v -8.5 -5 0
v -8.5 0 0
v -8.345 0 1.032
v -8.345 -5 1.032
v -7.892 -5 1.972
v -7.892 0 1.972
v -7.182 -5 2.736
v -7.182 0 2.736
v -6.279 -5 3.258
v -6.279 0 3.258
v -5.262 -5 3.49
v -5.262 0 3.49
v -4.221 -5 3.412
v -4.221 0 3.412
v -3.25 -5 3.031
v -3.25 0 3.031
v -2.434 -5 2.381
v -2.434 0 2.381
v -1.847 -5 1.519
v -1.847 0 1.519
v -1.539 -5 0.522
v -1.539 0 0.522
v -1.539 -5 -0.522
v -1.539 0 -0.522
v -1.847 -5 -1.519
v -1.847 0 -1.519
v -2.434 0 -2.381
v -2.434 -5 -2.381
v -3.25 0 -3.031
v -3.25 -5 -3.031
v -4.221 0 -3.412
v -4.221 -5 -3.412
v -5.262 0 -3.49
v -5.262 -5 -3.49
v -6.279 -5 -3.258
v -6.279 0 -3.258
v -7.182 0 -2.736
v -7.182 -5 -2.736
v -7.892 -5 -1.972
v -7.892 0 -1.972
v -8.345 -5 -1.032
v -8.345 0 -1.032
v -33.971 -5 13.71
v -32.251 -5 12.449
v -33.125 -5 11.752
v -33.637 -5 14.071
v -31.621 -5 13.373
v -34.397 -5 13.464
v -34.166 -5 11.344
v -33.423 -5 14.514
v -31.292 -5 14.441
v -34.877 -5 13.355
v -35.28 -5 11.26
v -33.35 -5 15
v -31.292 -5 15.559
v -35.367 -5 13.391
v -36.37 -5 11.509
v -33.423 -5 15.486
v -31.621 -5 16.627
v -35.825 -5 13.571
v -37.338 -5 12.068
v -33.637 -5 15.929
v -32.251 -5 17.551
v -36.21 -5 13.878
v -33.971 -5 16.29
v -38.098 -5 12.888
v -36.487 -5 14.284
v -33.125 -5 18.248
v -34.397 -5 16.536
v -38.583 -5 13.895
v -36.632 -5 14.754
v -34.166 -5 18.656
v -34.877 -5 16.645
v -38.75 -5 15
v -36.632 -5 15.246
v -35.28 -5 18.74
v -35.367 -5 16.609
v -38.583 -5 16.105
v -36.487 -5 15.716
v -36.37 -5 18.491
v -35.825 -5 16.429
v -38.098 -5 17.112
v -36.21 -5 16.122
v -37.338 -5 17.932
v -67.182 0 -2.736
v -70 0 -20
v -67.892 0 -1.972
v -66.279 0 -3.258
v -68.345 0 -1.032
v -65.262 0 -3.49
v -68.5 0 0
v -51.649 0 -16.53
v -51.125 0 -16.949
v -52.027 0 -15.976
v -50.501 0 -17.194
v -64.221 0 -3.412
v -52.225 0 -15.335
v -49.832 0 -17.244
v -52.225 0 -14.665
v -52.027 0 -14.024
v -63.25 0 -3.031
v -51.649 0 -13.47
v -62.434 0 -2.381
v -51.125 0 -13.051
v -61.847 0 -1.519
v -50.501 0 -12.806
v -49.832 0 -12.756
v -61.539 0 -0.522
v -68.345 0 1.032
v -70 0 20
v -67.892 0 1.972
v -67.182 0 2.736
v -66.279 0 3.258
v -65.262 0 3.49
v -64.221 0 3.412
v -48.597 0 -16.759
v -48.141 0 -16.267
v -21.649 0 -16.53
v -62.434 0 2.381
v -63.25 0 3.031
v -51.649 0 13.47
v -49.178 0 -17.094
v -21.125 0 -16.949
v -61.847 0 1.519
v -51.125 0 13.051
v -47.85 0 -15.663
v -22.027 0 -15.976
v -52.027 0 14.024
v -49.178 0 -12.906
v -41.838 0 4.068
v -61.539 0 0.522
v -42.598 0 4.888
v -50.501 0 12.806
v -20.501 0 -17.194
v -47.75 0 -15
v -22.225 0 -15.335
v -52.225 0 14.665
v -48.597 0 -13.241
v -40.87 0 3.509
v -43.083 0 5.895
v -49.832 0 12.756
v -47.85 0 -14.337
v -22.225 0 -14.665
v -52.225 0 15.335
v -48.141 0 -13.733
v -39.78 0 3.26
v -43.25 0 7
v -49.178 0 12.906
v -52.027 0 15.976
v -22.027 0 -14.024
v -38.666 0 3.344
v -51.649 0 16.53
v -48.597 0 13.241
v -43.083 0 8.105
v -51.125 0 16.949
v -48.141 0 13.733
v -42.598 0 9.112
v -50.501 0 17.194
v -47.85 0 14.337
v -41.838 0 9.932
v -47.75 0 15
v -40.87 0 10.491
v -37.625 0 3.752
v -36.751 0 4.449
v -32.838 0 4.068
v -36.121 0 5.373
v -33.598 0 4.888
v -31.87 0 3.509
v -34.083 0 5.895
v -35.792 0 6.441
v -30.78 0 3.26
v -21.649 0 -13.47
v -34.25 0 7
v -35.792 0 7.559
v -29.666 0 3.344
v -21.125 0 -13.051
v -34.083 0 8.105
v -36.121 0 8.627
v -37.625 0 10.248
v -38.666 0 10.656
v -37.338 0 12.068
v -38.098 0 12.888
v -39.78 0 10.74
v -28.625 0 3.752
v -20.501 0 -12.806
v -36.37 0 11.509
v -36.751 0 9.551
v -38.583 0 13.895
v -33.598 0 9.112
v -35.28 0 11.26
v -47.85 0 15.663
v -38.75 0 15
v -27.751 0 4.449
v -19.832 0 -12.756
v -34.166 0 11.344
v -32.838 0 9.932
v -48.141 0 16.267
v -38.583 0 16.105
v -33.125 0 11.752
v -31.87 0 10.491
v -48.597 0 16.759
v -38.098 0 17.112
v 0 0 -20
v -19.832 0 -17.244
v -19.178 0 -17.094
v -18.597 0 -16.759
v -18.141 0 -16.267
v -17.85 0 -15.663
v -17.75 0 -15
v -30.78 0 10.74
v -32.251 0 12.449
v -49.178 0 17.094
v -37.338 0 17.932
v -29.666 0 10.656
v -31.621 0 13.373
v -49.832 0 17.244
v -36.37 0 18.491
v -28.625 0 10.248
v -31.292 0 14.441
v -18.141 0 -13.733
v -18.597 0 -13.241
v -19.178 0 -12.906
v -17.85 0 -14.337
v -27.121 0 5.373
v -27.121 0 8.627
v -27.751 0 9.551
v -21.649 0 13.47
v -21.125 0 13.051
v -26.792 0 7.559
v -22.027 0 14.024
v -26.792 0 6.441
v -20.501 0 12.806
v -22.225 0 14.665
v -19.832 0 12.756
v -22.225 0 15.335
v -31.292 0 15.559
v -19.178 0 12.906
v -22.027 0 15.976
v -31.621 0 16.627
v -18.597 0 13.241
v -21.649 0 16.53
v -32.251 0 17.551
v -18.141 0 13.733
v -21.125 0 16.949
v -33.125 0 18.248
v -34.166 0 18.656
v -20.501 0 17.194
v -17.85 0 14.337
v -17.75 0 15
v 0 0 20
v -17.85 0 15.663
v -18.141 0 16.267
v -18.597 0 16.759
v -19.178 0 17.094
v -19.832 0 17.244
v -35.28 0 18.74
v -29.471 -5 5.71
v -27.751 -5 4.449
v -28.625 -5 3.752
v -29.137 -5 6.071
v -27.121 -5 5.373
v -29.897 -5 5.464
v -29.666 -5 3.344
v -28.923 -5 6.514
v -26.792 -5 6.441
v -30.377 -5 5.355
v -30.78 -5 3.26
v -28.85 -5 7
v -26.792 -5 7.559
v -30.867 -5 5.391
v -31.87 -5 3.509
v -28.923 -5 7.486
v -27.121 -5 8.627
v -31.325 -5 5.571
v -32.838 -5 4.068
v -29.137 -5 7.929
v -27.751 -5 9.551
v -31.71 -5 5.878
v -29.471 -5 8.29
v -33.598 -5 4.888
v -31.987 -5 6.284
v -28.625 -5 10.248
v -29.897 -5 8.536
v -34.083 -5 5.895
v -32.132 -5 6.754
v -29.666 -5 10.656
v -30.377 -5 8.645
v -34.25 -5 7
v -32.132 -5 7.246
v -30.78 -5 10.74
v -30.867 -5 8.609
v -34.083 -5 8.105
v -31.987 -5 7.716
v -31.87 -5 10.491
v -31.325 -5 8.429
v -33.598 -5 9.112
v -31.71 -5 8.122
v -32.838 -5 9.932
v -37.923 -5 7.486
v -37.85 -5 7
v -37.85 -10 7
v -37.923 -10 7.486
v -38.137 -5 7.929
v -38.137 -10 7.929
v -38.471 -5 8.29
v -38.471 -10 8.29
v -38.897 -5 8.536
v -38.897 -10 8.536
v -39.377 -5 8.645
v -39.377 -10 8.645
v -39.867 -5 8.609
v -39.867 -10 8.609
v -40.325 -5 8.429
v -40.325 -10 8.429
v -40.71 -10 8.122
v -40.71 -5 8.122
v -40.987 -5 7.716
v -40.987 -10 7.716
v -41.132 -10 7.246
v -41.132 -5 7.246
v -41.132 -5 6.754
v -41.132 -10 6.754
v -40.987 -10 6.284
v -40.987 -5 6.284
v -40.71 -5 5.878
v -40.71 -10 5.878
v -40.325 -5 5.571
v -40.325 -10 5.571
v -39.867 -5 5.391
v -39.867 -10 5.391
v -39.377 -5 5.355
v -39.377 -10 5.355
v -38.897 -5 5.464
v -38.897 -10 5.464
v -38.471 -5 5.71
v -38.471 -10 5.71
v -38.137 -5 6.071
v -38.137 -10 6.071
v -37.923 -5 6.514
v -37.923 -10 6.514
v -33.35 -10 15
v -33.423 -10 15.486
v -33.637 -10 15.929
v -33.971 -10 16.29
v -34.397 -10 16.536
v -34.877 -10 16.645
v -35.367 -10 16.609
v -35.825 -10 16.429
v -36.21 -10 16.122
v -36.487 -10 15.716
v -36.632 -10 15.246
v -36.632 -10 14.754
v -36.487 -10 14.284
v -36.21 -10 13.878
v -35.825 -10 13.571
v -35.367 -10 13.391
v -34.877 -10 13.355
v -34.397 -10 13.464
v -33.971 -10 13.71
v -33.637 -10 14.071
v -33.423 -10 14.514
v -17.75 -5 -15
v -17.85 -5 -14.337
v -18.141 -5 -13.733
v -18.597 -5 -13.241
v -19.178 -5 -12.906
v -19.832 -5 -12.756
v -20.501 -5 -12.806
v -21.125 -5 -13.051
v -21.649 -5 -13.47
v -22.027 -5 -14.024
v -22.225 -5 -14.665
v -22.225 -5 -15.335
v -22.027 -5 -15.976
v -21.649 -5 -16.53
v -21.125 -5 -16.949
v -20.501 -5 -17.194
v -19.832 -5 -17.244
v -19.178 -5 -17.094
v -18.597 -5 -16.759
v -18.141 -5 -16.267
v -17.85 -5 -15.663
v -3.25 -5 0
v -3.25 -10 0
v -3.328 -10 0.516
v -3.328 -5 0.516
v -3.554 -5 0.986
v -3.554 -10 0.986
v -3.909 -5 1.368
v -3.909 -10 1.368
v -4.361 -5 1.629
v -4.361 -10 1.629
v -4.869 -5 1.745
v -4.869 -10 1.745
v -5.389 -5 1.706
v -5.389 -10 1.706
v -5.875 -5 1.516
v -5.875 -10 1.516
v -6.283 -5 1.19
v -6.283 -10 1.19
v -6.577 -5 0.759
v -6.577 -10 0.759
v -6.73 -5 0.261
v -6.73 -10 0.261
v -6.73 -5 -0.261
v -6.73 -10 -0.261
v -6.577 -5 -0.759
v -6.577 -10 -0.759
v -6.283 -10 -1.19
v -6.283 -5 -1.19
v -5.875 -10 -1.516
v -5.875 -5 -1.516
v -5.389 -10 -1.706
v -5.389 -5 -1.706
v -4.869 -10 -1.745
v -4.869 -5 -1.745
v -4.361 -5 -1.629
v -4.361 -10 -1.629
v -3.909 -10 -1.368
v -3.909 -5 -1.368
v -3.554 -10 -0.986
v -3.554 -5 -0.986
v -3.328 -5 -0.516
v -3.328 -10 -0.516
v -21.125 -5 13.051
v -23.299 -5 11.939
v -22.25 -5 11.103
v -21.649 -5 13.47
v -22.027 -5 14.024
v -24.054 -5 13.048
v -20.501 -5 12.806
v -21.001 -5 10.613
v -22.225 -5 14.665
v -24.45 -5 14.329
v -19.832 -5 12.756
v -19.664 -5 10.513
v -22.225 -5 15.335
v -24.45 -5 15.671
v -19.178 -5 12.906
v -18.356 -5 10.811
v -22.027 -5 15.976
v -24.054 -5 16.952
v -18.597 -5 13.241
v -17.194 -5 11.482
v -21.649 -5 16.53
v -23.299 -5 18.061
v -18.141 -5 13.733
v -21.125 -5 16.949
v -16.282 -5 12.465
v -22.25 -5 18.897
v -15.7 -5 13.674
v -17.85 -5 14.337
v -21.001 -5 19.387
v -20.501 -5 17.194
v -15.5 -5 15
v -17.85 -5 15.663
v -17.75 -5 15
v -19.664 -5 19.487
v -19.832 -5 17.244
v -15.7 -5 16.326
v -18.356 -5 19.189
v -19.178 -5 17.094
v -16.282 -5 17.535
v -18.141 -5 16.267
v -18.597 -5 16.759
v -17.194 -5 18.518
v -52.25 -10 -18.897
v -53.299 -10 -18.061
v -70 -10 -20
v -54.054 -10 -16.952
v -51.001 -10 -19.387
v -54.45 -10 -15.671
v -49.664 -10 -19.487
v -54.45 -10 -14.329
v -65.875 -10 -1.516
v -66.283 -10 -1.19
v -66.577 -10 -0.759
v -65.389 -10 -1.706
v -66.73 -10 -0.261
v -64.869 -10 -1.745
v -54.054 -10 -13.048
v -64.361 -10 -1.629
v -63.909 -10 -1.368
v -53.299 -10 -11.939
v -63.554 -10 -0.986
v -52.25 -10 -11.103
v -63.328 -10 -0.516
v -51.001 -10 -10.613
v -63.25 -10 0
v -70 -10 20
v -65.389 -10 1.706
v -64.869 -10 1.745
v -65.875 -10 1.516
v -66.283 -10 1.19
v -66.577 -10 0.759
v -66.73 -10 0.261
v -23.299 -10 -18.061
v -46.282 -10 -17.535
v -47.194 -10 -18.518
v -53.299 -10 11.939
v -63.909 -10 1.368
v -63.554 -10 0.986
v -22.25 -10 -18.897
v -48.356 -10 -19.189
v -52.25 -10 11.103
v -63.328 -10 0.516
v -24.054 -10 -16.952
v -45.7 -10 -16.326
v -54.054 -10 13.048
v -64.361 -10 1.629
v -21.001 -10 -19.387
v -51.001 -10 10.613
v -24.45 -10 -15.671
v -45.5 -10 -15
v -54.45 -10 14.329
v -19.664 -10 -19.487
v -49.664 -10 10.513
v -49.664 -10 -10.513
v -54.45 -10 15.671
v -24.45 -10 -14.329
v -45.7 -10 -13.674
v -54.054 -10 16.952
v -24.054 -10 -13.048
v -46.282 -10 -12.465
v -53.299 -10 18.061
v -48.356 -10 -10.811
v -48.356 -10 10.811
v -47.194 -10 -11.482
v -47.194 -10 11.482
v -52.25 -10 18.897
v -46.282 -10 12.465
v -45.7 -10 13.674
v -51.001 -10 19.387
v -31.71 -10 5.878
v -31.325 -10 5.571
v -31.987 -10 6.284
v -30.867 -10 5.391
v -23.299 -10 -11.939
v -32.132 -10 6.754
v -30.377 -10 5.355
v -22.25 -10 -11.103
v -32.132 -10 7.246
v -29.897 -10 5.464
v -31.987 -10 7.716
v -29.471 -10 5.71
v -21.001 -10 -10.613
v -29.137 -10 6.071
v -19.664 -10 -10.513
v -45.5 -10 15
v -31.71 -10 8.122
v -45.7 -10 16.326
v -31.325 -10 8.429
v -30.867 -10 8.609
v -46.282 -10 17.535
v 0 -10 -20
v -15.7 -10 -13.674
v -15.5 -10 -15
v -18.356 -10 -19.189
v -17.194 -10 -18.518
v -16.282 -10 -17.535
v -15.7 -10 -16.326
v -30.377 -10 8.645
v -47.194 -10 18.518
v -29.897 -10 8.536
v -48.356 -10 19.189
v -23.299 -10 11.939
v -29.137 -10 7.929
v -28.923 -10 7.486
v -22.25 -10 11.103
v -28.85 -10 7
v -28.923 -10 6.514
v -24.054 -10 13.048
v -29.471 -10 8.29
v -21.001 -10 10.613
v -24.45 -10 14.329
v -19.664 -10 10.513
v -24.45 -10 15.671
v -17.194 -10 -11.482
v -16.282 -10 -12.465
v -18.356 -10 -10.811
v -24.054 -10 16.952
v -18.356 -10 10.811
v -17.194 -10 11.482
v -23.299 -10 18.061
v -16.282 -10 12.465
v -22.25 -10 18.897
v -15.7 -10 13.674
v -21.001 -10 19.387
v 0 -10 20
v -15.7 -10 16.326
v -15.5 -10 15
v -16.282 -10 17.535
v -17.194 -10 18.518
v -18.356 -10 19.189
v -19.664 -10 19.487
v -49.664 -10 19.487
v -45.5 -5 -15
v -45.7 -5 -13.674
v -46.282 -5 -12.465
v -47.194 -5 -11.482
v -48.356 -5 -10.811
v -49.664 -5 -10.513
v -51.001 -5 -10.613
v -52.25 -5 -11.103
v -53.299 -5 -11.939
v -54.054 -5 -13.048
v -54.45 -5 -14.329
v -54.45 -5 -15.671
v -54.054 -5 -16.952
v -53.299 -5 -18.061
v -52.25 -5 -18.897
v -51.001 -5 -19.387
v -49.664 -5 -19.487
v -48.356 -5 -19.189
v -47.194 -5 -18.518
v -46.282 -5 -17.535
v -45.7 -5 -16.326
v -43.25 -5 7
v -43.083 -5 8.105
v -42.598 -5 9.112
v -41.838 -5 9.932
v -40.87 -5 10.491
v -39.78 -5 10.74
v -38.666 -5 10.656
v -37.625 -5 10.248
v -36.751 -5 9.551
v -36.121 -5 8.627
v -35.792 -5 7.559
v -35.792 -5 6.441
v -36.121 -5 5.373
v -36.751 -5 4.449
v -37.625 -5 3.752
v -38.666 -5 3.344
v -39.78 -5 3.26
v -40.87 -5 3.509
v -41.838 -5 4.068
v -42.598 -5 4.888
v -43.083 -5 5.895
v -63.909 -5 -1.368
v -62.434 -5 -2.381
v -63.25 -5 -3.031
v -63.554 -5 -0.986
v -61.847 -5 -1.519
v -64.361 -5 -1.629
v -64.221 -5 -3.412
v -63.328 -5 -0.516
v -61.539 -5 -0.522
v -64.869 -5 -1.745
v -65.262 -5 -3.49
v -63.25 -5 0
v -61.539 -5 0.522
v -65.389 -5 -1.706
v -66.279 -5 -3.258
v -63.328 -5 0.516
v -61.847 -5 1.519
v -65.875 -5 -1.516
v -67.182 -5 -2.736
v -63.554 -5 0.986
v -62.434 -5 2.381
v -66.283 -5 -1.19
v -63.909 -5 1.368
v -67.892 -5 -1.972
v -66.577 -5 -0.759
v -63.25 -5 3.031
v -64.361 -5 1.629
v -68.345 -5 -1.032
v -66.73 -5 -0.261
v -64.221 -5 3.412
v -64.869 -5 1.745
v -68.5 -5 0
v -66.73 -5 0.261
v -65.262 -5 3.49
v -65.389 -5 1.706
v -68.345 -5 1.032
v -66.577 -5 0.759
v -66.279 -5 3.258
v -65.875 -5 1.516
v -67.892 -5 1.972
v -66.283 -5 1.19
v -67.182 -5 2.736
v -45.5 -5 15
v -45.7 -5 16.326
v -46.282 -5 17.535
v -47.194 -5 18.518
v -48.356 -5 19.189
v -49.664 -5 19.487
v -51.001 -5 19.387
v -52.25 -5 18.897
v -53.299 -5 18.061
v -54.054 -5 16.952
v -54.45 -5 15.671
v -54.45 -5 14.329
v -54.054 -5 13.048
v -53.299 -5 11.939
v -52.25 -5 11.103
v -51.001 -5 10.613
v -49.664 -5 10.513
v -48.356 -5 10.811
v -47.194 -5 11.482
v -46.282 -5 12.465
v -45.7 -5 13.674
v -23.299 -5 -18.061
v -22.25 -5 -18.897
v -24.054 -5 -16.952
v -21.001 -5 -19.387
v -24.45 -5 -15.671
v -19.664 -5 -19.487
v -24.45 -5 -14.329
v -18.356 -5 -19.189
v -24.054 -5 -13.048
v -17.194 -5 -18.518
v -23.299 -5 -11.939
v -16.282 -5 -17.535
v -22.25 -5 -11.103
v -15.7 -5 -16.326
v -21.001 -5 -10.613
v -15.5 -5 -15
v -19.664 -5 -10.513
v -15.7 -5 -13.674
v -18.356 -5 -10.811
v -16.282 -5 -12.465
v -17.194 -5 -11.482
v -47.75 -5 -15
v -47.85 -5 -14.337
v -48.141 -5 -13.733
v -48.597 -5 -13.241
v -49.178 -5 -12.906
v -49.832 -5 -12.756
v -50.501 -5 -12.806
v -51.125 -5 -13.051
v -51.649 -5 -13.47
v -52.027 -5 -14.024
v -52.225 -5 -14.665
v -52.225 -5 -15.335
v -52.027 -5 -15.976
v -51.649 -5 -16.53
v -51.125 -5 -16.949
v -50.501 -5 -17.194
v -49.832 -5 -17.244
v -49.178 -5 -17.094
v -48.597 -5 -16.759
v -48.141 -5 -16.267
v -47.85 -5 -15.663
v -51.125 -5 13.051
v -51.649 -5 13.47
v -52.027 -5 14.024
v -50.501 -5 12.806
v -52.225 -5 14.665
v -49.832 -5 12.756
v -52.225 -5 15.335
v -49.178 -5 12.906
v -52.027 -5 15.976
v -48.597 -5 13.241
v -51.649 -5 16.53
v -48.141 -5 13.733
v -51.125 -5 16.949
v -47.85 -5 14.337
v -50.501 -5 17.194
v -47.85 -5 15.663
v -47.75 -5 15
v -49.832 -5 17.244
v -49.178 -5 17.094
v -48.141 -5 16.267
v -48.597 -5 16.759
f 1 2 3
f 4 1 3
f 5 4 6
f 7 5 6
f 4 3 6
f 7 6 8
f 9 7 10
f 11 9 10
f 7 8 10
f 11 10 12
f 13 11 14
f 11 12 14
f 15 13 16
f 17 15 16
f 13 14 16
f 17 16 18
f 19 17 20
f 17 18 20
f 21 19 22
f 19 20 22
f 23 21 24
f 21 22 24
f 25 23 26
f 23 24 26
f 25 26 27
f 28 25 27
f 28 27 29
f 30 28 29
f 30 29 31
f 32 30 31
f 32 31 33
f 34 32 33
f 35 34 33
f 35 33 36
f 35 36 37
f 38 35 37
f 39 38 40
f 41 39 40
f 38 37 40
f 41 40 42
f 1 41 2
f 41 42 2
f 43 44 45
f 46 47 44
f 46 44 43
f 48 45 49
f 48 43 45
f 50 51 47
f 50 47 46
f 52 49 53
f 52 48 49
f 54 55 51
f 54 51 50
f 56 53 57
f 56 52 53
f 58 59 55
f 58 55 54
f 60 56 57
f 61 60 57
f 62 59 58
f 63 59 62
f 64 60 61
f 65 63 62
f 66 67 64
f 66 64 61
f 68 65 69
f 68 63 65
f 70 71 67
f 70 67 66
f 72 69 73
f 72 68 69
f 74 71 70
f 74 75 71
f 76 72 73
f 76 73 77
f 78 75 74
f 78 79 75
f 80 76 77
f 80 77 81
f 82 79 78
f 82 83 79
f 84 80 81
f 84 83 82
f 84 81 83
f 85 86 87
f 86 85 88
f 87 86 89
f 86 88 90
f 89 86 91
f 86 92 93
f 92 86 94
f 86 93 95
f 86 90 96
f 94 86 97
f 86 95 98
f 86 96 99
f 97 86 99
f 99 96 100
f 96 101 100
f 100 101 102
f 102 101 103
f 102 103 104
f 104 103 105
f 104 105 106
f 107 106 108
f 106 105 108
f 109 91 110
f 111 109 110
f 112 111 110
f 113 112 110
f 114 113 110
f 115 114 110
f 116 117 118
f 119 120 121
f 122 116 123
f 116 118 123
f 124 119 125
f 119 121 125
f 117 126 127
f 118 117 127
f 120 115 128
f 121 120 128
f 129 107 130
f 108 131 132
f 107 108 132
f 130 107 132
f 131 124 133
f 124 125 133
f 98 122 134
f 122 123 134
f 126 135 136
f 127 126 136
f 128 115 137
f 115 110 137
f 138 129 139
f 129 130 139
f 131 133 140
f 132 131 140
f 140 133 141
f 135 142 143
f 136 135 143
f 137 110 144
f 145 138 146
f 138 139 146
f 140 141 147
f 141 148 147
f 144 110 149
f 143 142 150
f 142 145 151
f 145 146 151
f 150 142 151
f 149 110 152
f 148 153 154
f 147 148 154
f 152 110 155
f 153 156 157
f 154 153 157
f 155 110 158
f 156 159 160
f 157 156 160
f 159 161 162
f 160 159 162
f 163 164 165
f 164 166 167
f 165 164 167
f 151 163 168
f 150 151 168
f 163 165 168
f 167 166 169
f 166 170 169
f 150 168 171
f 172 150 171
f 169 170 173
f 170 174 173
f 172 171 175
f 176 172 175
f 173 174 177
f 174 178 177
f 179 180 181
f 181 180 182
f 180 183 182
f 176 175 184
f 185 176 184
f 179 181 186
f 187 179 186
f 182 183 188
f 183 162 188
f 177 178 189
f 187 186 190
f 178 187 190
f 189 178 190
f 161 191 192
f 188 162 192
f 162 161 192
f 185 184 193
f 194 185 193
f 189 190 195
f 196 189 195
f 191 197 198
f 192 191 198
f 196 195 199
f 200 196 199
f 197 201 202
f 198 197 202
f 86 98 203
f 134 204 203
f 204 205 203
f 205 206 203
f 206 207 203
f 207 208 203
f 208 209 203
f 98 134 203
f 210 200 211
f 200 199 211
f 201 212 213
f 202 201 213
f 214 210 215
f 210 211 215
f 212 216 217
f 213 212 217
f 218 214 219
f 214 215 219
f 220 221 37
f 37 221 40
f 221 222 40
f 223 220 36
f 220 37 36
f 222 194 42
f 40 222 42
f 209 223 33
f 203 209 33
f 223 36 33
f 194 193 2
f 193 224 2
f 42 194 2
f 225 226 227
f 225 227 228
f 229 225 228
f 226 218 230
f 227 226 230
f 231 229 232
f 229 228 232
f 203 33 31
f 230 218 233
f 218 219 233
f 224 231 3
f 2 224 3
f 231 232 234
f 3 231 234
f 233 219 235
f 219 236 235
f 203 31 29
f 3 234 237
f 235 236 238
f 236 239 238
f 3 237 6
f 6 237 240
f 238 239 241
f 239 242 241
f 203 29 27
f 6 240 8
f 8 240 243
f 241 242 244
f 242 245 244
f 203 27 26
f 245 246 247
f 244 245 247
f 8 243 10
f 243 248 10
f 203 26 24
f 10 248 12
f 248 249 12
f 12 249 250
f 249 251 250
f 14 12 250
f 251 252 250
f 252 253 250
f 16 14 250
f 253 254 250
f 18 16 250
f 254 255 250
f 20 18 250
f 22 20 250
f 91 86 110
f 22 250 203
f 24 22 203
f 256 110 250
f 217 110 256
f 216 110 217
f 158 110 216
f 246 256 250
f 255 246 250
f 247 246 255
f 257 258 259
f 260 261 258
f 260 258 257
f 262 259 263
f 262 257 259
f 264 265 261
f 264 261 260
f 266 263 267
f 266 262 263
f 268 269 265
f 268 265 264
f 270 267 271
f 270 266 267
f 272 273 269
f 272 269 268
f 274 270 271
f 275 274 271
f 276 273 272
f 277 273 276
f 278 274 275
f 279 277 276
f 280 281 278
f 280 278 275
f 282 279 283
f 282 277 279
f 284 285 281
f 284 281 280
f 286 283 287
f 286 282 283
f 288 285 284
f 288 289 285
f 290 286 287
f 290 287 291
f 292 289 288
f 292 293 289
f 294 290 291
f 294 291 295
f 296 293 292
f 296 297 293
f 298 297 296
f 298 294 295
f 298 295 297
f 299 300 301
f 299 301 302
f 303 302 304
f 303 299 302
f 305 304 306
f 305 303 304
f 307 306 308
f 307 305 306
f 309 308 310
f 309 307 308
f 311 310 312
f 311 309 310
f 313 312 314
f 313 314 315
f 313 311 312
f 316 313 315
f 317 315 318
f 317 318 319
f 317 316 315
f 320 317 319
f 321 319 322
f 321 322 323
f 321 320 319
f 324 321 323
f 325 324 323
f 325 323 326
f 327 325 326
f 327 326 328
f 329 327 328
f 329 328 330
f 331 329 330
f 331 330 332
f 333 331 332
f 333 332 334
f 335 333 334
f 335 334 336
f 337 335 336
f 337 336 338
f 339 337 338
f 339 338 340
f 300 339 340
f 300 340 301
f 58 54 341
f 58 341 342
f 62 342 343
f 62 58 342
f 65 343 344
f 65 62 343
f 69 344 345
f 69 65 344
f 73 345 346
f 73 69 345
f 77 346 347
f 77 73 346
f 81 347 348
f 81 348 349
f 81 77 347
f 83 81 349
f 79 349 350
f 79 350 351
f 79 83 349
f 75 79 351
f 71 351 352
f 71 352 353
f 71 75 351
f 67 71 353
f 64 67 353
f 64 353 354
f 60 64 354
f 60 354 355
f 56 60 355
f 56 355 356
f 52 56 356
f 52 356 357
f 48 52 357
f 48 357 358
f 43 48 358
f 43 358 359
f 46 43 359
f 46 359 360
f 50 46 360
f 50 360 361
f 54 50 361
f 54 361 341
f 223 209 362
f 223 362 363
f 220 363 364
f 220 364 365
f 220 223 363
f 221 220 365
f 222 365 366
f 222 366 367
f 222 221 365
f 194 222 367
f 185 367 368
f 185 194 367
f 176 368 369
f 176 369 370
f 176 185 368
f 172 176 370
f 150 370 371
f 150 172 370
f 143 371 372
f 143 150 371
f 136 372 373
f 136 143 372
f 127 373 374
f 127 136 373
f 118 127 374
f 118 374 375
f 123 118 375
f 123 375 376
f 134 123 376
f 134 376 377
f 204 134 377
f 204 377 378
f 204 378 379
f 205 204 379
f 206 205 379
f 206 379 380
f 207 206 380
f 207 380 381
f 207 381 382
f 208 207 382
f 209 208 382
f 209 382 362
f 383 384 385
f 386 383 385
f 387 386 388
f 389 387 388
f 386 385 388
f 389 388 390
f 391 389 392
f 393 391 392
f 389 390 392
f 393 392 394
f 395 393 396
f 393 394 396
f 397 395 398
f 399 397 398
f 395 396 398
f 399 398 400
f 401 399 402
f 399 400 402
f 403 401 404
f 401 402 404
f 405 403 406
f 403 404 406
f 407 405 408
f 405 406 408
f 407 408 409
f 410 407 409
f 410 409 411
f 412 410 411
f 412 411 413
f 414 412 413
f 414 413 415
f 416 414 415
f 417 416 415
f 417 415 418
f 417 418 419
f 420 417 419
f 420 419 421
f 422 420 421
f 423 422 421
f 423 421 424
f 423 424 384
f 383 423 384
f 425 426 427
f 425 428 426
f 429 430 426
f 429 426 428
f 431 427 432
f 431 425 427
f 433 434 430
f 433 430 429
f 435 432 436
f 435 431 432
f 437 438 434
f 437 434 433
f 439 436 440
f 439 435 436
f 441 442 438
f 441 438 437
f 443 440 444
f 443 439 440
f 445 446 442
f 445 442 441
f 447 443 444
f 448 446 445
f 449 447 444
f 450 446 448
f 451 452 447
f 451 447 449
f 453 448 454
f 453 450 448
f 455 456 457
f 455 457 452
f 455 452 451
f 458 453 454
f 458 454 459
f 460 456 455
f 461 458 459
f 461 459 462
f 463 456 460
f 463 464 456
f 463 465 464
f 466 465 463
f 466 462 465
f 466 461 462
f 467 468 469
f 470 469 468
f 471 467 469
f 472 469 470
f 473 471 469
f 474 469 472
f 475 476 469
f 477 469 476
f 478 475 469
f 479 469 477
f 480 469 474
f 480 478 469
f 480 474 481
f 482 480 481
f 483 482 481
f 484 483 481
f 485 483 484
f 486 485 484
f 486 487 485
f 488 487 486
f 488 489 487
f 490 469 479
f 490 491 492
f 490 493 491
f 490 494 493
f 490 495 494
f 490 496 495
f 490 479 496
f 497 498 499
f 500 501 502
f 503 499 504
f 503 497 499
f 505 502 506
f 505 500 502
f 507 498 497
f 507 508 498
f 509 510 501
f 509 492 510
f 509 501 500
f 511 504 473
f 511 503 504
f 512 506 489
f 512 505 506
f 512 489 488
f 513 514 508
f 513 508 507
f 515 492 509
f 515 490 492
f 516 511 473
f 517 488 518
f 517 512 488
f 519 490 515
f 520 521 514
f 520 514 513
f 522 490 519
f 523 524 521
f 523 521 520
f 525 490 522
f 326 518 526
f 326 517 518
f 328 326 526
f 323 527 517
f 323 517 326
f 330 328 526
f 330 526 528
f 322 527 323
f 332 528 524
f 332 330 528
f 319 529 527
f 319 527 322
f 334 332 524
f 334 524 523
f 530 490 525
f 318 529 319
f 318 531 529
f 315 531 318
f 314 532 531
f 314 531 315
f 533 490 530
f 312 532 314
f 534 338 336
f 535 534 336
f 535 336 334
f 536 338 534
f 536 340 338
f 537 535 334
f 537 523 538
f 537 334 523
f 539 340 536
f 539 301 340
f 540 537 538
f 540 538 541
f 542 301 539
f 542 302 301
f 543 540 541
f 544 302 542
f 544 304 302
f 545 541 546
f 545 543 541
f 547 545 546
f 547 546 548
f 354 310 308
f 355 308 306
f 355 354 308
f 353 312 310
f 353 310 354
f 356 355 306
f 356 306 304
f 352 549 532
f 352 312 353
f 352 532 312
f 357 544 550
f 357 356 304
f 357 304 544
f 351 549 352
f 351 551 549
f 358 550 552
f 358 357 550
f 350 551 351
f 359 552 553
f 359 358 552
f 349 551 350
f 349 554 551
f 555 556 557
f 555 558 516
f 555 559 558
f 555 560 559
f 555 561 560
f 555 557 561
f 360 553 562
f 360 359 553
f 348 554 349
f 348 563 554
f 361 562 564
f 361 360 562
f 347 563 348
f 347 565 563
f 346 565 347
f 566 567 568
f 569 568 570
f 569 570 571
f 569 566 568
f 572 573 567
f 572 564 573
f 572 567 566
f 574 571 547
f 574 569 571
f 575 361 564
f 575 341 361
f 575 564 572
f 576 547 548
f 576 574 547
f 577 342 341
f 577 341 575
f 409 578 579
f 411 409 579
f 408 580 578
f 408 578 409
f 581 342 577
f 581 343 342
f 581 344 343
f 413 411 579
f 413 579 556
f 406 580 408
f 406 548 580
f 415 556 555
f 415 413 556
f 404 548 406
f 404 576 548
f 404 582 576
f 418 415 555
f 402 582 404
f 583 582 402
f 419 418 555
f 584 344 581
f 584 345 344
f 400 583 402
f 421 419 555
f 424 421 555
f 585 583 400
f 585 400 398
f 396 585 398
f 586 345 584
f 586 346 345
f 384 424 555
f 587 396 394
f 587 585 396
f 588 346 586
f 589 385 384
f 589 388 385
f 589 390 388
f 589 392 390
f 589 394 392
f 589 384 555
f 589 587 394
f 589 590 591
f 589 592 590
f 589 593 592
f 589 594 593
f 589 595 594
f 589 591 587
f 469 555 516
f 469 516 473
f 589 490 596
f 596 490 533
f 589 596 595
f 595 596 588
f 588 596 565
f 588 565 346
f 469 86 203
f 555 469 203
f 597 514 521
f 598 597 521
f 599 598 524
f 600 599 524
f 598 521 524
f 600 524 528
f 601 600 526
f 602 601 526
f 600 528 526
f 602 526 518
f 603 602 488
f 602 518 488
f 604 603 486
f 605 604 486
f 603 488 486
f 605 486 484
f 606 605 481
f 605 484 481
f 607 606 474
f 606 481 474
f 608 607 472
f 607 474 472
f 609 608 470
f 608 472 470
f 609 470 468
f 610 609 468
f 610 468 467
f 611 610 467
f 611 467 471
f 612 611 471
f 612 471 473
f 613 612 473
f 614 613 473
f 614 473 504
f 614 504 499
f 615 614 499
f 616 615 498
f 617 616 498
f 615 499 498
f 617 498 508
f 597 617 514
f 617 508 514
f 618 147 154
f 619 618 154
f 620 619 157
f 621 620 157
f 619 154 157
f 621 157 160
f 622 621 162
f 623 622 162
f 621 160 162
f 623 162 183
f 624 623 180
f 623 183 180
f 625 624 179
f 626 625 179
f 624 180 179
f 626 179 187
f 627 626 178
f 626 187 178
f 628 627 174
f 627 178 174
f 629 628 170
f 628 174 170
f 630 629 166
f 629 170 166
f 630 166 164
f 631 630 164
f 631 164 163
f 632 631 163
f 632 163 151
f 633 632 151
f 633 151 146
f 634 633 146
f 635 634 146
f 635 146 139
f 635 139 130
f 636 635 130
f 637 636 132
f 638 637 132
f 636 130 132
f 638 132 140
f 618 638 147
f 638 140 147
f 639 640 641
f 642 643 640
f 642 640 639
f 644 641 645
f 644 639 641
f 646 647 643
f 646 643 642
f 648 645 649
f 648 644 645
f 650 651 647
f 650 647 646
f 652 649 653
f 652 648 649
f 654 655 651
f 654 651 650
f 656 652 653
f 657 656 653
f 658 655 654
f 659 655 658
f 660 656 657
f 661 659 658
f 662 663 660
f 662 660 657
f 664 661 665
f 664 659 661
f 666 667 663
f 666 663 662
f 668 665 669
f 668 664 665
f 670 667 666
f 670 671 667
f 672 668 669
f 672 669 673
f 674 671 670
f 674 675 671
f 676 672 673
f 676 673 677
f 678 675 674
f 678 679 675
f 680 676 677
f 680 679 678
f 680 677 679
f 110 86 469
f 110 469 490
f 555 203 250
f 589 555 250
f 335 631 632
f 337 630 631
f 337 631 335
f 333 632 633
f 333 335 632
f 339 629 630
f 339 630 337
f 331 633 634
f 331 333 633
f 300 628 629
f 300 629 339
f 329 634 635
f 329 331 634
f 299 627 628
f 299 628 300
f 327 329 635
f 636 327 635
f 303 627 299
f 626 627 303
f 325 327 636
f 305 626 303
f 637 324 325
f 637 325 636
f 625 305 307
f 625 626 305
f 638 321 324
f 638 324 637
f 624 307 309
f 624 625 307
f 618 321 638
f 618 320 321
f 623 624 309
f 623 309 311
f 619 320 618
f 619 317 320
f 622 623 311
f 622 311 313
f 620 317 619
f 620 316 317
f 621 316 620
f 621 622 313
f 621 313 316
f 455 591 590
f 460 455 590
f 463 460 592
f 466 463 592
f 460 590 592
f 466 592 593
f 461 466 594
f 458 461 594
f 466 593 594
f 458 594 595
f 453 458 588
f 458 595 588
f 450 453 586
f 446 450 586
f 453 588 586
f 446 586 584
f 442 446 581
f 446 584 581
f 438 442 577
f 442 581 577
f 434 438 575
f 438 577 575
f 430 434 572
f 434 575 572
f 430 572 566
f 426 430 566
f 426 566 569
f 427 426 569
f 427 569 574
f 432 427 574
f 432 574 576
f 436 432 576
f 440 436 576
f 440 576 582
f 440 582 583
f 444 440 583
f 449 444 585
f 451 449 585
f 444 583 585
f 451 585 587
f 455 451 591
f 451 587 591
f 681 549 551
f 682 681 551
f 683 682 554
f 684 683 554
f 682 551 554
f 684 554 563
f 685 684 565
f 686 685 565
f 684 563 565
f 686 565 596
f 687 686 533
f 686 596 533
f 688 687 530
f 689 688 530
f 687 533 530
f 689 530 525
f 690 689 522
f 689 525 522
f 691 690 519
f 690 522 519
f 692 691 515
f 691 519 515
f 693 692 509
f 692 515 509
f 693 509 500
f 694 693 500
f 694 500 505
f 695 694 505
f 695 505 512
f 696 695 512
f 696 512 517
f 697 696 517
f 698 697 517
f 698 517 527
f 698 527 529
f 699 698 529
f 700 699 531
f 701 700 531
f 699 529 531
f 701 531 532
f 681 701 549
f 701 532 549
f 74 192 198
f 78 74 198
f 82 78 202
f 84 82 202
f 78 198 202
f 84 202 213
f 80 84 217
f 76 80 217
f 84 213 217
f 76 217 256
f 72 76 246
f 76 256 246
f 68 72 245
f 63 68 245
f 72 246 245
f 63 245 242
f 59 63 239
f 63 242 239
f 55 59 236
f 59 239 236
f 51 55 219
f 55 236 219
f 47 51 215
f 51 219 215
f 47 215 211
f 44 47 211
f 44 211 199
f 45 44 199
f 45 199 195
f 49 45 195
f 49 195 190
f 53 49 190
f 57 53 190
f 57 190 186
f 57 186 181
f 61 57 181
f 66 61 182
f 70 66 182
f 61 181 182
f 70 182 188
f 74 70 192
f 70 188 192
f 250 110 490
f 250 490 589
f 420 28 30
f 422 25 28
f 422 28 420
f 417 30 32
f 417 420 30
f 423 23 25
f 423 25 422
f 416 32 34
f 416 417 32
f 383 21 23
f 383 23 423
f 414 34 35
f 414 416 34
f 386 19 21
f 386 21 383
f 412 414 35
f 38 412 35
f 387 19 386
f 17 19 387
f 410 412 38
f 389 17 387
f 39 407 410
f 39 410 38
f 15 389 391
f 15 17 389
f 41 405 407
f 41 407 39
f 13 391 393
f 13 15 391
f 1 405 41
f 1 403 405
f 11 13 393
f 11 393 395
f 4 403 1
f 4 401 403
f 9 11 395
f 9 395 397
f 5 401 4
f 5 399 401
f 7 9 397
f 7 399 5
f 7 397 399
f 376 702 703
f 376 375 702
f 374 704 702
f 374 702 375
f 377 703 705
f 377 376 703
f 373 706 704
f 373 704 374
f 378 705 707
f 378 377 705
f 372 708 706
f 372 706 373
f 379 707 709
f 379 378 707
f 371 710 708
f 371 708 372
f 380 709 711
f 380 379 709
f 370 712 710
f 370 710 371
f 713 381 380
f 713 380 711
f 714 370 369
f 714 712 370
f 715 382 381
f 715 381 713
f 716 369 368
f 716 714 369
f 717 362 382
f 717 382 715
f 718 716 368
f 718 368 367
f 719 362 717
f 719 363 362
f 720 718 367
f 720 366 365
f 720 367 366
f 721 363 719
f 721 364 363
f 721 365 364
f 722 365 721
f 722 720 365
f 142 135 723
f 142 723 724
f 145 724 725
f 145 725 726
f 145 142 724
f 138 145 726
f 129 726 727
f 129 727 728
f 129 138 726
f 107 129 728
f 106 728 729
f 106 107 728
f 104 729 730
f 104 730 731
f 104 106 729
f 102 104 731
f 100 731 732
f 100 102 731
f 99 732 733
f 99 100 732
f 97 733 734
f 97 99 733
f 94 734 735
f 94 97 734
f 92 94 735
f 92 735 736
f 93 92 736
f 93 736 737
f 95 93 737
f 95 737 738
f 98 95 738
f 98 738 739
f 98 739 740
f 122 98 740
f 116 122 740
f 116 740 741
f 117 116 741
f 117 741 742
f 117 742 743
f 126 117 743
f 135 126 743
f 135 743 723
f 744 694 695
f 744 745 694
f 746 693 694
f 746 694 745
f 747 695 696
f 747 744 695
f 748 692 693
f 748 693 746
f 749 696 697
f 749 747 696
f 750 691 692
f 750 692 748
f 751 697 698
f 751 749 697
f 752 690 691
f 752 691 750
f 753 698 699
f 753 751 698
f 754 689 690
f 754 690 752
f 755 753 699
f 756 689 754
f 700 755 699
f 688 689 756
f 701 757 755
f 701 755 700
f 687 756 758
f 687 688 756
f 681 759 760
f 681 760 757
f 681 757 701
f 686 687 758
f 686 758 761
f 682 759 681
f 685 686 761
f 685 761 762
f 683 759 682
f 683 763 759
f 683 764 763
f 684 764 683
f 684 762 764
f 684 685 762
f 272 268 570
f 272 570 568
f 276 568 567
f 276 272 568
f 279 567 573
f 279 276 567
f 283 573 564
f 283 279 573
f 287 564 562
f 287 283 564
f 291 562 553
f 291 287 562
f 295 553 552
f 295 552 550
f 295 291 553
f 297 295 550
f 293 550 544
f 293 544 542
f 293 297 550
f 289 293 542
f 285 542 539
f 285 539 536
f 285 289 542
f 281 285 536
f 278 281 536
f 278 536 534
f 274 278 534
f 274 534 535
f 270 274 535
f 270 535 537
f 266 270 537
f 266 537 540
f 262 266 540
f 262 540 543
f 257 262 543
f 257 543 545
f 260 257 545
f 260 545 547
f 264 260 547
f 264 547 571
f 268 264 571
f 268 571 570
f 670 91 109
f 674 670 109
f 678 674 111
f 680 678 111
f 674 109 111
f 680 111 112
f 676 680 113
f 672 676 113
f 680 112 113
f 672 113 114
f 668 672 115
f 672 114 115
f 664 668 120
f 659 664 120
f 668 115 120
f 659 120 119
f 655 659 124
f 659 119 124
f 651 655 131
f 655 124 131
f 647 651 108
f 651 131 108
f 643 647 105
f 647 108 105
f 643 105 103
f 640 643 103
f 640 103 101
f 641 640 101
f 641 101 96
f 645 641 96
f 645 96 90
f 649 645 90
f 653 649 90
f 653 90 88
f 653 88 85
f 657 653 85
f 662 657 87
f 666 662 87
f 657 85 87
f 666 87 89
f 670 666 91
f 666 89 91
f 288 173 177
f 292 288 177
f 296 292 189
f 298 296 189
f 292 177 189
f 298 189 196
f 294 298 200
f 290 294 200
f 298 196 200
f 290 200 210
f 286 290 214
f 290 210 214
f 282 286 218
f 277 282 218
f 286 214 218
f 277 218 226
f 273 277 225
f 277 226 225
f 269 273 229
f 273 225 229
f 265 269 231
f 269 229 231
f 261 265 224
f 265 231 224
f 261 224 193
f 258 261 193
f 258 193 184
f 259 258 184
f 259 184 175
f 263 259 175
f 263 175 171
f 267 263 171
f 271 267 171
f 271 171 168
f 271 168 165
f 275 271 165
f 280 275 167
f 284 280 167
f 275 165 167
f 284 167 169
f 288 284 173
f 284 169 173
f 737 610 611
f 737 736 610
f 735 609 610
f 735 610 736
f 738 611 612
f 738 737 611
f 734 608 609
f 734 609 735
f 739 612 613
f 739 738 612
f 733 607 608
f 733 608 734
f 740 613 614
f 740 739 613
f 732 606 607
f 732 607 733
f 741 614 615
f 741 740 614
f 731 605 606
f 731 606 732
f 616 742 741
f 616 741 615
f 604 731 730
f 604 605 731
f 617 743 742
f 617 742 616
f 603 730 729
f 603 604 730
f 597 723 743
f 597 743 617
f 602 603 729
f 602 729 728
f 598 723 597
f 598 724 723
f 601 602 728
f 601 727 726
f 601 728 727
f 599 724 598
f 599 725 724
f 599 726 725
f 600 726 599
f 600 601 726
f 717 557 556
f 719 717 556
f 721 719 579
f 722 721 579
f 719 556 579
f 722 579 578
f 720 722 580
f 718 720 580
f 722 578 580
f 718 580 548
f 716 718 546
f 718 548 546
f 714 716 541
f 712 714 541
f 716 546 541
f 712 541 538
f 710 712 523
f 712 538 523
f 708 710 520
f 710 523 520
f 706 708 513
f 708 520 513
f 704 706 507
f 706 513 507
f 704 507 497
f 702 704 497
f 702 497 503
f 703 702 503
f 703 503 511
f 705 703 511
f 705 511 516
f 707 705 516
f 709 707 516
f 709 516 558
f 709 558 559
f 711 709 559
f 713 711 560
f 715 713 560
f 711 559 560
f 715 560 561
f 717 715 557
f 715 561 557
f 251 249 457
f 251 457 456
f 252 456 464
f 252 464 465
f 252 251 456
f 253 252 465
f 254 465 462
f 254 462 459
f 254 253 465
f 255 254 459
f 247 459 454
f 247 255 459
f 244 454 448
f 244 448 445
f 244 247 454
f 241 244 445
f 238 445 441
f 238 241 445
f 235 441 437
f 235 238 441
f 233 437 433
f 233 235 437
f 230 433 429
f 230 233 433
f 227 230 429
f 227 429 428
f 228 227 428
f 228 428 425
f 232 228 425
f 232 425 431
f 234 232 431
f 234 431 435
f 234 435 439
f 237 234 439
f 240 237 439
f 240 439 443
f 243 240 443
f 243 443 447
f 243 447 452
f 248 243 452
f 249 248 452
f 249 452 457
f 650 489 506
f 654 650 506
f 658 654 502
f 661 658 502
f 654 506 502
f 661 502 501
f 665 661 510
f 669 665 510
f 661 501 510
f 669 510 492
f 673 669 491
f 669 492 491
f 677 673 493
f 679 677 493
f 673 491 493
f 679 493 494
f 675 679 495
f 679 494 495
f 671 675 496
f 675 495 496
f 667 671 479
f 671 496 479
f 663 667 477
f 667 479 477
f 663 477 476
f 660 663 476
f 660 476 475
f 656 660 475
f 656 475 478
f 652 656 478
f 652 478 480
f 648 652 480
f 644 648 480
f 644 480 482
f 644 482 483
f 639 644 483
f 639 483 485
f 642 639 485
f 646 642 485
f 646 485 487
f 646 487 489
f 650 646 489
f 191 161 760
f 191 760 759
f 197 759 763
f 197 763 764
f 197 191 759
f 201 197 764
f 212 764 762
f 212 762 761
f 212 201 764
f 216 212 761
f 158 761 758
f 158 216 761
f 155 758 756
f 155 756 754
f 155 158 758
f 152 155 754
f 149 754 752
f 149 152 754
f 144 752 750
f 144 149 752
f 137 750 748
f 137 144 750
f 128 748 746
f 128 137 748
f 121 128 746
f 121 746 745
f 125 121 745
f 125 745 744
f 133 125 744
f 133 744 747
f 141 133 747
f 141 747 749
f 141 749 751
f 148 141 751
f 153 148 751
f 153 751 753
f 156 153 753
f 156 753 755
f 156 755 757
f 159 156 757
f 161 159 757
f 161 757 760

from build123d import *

# Parameters (mm, degrees)
F0_W     = 70
F0_H     = 40
F0_R     = 2.25
F0_R_2   = 1.65
F1_DEPTH = 10
F2_R     = 2.25
F2_R_2   = 4.5
F3_DEPTH = 5
F4_R     = 3.75
F5_DEPTH = 5
F6_R     = 1.75
F7_DEPTH = 25
F8_R     = 3.5
F9_DEPTH = 5


with BuildPart() as f1:
    # F0 (on Front) → F1 (new body)
    with BuildSketch(Plane.XZ):
        with Locations((-35, 0)):
            Rectangle(F0_W, F0_H)
        with Locations((-50, -15)):
            Circle(F0_R, mode=Mode.SUBTRACT)
        with Locations((-20, -15)):
            Circle(F0_R, mode=Mode.SUBTRACT)
        with Locations((-39.5, 7)):
            Circle(F0_R_2, mode=Mode.SUBTRACT)
        with Locations((-50, 15)):
            Circle(F0_R, mode=Mode.SUBTRACT)
        with Locations((-30.5, 7)):
            Circle(F0_R_2, mode=Mode.SUBTRACT)
        with Locations((-35, 15)):
            Circle(F0_R_2, mode=Mode.SUBTRACT)
        with Locations((-20, 15)):
            Circle(F0_R, mode=Mode.SUBTRACT)
    extrude(amount=F1_DEPTH)

    # F2 (on face) → F3 (cut)
    with BuildSketch(Plane.XZ.offset(10)):
        with Locations((-50, 15)):
            Circle(F2_R)
        with Locations((-20, 15)):
            Circle(F2_R)
        with Locations((-20, -15)):
            Circle(F2_R)
        with Locations((-50, -15)):
            Circle(F2_R)
        with Locations((-20, 15)):
            Circle(F2_R_2)
        with Locations((-20, 15)):
            Circle(F2_R, mode=Mode.SUBTRACT)
        with Locations((-20, -15)):
            Circle(F2_R_2)
        with Locations((-20, -15)):
            Circle(F2_R, mode=Mode.SUBTRACT)
        with Locations((-50, -15)):
            Circle(F2_R_2)
        with Locations((-50, -15)):
            Circle(F2_R, mode=Mode.SUBTRACT)
        with Locations((-50, 15)):
            Circle(F2_R_2)
        with Locations((-50, 15)):
            Circle(F2_R, mode=Mode.SUBTRACT)
    extrude(amount=-F3_DEPTH, mode=Mode.SUBTRACT)

    # F4 (on face) → F5 (cut)
    with BuildSketch(Plane(origin=(0, 0, 0), x_dir=(-1, 0, 0), z_dir=(0, 1, 0))):
        with Locations((35, 15)):
            Circle(F4_R)
        with Locations((30.5, 7)):
            Circle(F4_R)
        with Locations((39.5, 7)):
            Circle(F4_R)
    extrude(amount=-F5_DEPTH, mode=Mode.SUBTRACT)

    # F6 (on face) → F7 (cut)
    with BuildSketch(Plane.XZ.offset(10)):
        with Locations((-65, 0)):
            Circle(F6_R)
        with Locations((-5, 0)):
            Circle(F6_R)
    extrude(amount=-F7_DEPTH, mode=Mode.SUBTRACT)

    # F8 (on face) → F9 (cut)
    with BuildSketch(Plane(origin=(0, 0, 0), x_dir=(-1, 0, 0), z_dir=(0, 1, 0))):
        with Locations((5, 0)):
            Circle(F8_R)
        with Locations((65, 0)):
            Circle(F8_R)
    extrude(amount=-F9_DEPTH, mode=Mode.SUBTRACT)


solid = f1.part
